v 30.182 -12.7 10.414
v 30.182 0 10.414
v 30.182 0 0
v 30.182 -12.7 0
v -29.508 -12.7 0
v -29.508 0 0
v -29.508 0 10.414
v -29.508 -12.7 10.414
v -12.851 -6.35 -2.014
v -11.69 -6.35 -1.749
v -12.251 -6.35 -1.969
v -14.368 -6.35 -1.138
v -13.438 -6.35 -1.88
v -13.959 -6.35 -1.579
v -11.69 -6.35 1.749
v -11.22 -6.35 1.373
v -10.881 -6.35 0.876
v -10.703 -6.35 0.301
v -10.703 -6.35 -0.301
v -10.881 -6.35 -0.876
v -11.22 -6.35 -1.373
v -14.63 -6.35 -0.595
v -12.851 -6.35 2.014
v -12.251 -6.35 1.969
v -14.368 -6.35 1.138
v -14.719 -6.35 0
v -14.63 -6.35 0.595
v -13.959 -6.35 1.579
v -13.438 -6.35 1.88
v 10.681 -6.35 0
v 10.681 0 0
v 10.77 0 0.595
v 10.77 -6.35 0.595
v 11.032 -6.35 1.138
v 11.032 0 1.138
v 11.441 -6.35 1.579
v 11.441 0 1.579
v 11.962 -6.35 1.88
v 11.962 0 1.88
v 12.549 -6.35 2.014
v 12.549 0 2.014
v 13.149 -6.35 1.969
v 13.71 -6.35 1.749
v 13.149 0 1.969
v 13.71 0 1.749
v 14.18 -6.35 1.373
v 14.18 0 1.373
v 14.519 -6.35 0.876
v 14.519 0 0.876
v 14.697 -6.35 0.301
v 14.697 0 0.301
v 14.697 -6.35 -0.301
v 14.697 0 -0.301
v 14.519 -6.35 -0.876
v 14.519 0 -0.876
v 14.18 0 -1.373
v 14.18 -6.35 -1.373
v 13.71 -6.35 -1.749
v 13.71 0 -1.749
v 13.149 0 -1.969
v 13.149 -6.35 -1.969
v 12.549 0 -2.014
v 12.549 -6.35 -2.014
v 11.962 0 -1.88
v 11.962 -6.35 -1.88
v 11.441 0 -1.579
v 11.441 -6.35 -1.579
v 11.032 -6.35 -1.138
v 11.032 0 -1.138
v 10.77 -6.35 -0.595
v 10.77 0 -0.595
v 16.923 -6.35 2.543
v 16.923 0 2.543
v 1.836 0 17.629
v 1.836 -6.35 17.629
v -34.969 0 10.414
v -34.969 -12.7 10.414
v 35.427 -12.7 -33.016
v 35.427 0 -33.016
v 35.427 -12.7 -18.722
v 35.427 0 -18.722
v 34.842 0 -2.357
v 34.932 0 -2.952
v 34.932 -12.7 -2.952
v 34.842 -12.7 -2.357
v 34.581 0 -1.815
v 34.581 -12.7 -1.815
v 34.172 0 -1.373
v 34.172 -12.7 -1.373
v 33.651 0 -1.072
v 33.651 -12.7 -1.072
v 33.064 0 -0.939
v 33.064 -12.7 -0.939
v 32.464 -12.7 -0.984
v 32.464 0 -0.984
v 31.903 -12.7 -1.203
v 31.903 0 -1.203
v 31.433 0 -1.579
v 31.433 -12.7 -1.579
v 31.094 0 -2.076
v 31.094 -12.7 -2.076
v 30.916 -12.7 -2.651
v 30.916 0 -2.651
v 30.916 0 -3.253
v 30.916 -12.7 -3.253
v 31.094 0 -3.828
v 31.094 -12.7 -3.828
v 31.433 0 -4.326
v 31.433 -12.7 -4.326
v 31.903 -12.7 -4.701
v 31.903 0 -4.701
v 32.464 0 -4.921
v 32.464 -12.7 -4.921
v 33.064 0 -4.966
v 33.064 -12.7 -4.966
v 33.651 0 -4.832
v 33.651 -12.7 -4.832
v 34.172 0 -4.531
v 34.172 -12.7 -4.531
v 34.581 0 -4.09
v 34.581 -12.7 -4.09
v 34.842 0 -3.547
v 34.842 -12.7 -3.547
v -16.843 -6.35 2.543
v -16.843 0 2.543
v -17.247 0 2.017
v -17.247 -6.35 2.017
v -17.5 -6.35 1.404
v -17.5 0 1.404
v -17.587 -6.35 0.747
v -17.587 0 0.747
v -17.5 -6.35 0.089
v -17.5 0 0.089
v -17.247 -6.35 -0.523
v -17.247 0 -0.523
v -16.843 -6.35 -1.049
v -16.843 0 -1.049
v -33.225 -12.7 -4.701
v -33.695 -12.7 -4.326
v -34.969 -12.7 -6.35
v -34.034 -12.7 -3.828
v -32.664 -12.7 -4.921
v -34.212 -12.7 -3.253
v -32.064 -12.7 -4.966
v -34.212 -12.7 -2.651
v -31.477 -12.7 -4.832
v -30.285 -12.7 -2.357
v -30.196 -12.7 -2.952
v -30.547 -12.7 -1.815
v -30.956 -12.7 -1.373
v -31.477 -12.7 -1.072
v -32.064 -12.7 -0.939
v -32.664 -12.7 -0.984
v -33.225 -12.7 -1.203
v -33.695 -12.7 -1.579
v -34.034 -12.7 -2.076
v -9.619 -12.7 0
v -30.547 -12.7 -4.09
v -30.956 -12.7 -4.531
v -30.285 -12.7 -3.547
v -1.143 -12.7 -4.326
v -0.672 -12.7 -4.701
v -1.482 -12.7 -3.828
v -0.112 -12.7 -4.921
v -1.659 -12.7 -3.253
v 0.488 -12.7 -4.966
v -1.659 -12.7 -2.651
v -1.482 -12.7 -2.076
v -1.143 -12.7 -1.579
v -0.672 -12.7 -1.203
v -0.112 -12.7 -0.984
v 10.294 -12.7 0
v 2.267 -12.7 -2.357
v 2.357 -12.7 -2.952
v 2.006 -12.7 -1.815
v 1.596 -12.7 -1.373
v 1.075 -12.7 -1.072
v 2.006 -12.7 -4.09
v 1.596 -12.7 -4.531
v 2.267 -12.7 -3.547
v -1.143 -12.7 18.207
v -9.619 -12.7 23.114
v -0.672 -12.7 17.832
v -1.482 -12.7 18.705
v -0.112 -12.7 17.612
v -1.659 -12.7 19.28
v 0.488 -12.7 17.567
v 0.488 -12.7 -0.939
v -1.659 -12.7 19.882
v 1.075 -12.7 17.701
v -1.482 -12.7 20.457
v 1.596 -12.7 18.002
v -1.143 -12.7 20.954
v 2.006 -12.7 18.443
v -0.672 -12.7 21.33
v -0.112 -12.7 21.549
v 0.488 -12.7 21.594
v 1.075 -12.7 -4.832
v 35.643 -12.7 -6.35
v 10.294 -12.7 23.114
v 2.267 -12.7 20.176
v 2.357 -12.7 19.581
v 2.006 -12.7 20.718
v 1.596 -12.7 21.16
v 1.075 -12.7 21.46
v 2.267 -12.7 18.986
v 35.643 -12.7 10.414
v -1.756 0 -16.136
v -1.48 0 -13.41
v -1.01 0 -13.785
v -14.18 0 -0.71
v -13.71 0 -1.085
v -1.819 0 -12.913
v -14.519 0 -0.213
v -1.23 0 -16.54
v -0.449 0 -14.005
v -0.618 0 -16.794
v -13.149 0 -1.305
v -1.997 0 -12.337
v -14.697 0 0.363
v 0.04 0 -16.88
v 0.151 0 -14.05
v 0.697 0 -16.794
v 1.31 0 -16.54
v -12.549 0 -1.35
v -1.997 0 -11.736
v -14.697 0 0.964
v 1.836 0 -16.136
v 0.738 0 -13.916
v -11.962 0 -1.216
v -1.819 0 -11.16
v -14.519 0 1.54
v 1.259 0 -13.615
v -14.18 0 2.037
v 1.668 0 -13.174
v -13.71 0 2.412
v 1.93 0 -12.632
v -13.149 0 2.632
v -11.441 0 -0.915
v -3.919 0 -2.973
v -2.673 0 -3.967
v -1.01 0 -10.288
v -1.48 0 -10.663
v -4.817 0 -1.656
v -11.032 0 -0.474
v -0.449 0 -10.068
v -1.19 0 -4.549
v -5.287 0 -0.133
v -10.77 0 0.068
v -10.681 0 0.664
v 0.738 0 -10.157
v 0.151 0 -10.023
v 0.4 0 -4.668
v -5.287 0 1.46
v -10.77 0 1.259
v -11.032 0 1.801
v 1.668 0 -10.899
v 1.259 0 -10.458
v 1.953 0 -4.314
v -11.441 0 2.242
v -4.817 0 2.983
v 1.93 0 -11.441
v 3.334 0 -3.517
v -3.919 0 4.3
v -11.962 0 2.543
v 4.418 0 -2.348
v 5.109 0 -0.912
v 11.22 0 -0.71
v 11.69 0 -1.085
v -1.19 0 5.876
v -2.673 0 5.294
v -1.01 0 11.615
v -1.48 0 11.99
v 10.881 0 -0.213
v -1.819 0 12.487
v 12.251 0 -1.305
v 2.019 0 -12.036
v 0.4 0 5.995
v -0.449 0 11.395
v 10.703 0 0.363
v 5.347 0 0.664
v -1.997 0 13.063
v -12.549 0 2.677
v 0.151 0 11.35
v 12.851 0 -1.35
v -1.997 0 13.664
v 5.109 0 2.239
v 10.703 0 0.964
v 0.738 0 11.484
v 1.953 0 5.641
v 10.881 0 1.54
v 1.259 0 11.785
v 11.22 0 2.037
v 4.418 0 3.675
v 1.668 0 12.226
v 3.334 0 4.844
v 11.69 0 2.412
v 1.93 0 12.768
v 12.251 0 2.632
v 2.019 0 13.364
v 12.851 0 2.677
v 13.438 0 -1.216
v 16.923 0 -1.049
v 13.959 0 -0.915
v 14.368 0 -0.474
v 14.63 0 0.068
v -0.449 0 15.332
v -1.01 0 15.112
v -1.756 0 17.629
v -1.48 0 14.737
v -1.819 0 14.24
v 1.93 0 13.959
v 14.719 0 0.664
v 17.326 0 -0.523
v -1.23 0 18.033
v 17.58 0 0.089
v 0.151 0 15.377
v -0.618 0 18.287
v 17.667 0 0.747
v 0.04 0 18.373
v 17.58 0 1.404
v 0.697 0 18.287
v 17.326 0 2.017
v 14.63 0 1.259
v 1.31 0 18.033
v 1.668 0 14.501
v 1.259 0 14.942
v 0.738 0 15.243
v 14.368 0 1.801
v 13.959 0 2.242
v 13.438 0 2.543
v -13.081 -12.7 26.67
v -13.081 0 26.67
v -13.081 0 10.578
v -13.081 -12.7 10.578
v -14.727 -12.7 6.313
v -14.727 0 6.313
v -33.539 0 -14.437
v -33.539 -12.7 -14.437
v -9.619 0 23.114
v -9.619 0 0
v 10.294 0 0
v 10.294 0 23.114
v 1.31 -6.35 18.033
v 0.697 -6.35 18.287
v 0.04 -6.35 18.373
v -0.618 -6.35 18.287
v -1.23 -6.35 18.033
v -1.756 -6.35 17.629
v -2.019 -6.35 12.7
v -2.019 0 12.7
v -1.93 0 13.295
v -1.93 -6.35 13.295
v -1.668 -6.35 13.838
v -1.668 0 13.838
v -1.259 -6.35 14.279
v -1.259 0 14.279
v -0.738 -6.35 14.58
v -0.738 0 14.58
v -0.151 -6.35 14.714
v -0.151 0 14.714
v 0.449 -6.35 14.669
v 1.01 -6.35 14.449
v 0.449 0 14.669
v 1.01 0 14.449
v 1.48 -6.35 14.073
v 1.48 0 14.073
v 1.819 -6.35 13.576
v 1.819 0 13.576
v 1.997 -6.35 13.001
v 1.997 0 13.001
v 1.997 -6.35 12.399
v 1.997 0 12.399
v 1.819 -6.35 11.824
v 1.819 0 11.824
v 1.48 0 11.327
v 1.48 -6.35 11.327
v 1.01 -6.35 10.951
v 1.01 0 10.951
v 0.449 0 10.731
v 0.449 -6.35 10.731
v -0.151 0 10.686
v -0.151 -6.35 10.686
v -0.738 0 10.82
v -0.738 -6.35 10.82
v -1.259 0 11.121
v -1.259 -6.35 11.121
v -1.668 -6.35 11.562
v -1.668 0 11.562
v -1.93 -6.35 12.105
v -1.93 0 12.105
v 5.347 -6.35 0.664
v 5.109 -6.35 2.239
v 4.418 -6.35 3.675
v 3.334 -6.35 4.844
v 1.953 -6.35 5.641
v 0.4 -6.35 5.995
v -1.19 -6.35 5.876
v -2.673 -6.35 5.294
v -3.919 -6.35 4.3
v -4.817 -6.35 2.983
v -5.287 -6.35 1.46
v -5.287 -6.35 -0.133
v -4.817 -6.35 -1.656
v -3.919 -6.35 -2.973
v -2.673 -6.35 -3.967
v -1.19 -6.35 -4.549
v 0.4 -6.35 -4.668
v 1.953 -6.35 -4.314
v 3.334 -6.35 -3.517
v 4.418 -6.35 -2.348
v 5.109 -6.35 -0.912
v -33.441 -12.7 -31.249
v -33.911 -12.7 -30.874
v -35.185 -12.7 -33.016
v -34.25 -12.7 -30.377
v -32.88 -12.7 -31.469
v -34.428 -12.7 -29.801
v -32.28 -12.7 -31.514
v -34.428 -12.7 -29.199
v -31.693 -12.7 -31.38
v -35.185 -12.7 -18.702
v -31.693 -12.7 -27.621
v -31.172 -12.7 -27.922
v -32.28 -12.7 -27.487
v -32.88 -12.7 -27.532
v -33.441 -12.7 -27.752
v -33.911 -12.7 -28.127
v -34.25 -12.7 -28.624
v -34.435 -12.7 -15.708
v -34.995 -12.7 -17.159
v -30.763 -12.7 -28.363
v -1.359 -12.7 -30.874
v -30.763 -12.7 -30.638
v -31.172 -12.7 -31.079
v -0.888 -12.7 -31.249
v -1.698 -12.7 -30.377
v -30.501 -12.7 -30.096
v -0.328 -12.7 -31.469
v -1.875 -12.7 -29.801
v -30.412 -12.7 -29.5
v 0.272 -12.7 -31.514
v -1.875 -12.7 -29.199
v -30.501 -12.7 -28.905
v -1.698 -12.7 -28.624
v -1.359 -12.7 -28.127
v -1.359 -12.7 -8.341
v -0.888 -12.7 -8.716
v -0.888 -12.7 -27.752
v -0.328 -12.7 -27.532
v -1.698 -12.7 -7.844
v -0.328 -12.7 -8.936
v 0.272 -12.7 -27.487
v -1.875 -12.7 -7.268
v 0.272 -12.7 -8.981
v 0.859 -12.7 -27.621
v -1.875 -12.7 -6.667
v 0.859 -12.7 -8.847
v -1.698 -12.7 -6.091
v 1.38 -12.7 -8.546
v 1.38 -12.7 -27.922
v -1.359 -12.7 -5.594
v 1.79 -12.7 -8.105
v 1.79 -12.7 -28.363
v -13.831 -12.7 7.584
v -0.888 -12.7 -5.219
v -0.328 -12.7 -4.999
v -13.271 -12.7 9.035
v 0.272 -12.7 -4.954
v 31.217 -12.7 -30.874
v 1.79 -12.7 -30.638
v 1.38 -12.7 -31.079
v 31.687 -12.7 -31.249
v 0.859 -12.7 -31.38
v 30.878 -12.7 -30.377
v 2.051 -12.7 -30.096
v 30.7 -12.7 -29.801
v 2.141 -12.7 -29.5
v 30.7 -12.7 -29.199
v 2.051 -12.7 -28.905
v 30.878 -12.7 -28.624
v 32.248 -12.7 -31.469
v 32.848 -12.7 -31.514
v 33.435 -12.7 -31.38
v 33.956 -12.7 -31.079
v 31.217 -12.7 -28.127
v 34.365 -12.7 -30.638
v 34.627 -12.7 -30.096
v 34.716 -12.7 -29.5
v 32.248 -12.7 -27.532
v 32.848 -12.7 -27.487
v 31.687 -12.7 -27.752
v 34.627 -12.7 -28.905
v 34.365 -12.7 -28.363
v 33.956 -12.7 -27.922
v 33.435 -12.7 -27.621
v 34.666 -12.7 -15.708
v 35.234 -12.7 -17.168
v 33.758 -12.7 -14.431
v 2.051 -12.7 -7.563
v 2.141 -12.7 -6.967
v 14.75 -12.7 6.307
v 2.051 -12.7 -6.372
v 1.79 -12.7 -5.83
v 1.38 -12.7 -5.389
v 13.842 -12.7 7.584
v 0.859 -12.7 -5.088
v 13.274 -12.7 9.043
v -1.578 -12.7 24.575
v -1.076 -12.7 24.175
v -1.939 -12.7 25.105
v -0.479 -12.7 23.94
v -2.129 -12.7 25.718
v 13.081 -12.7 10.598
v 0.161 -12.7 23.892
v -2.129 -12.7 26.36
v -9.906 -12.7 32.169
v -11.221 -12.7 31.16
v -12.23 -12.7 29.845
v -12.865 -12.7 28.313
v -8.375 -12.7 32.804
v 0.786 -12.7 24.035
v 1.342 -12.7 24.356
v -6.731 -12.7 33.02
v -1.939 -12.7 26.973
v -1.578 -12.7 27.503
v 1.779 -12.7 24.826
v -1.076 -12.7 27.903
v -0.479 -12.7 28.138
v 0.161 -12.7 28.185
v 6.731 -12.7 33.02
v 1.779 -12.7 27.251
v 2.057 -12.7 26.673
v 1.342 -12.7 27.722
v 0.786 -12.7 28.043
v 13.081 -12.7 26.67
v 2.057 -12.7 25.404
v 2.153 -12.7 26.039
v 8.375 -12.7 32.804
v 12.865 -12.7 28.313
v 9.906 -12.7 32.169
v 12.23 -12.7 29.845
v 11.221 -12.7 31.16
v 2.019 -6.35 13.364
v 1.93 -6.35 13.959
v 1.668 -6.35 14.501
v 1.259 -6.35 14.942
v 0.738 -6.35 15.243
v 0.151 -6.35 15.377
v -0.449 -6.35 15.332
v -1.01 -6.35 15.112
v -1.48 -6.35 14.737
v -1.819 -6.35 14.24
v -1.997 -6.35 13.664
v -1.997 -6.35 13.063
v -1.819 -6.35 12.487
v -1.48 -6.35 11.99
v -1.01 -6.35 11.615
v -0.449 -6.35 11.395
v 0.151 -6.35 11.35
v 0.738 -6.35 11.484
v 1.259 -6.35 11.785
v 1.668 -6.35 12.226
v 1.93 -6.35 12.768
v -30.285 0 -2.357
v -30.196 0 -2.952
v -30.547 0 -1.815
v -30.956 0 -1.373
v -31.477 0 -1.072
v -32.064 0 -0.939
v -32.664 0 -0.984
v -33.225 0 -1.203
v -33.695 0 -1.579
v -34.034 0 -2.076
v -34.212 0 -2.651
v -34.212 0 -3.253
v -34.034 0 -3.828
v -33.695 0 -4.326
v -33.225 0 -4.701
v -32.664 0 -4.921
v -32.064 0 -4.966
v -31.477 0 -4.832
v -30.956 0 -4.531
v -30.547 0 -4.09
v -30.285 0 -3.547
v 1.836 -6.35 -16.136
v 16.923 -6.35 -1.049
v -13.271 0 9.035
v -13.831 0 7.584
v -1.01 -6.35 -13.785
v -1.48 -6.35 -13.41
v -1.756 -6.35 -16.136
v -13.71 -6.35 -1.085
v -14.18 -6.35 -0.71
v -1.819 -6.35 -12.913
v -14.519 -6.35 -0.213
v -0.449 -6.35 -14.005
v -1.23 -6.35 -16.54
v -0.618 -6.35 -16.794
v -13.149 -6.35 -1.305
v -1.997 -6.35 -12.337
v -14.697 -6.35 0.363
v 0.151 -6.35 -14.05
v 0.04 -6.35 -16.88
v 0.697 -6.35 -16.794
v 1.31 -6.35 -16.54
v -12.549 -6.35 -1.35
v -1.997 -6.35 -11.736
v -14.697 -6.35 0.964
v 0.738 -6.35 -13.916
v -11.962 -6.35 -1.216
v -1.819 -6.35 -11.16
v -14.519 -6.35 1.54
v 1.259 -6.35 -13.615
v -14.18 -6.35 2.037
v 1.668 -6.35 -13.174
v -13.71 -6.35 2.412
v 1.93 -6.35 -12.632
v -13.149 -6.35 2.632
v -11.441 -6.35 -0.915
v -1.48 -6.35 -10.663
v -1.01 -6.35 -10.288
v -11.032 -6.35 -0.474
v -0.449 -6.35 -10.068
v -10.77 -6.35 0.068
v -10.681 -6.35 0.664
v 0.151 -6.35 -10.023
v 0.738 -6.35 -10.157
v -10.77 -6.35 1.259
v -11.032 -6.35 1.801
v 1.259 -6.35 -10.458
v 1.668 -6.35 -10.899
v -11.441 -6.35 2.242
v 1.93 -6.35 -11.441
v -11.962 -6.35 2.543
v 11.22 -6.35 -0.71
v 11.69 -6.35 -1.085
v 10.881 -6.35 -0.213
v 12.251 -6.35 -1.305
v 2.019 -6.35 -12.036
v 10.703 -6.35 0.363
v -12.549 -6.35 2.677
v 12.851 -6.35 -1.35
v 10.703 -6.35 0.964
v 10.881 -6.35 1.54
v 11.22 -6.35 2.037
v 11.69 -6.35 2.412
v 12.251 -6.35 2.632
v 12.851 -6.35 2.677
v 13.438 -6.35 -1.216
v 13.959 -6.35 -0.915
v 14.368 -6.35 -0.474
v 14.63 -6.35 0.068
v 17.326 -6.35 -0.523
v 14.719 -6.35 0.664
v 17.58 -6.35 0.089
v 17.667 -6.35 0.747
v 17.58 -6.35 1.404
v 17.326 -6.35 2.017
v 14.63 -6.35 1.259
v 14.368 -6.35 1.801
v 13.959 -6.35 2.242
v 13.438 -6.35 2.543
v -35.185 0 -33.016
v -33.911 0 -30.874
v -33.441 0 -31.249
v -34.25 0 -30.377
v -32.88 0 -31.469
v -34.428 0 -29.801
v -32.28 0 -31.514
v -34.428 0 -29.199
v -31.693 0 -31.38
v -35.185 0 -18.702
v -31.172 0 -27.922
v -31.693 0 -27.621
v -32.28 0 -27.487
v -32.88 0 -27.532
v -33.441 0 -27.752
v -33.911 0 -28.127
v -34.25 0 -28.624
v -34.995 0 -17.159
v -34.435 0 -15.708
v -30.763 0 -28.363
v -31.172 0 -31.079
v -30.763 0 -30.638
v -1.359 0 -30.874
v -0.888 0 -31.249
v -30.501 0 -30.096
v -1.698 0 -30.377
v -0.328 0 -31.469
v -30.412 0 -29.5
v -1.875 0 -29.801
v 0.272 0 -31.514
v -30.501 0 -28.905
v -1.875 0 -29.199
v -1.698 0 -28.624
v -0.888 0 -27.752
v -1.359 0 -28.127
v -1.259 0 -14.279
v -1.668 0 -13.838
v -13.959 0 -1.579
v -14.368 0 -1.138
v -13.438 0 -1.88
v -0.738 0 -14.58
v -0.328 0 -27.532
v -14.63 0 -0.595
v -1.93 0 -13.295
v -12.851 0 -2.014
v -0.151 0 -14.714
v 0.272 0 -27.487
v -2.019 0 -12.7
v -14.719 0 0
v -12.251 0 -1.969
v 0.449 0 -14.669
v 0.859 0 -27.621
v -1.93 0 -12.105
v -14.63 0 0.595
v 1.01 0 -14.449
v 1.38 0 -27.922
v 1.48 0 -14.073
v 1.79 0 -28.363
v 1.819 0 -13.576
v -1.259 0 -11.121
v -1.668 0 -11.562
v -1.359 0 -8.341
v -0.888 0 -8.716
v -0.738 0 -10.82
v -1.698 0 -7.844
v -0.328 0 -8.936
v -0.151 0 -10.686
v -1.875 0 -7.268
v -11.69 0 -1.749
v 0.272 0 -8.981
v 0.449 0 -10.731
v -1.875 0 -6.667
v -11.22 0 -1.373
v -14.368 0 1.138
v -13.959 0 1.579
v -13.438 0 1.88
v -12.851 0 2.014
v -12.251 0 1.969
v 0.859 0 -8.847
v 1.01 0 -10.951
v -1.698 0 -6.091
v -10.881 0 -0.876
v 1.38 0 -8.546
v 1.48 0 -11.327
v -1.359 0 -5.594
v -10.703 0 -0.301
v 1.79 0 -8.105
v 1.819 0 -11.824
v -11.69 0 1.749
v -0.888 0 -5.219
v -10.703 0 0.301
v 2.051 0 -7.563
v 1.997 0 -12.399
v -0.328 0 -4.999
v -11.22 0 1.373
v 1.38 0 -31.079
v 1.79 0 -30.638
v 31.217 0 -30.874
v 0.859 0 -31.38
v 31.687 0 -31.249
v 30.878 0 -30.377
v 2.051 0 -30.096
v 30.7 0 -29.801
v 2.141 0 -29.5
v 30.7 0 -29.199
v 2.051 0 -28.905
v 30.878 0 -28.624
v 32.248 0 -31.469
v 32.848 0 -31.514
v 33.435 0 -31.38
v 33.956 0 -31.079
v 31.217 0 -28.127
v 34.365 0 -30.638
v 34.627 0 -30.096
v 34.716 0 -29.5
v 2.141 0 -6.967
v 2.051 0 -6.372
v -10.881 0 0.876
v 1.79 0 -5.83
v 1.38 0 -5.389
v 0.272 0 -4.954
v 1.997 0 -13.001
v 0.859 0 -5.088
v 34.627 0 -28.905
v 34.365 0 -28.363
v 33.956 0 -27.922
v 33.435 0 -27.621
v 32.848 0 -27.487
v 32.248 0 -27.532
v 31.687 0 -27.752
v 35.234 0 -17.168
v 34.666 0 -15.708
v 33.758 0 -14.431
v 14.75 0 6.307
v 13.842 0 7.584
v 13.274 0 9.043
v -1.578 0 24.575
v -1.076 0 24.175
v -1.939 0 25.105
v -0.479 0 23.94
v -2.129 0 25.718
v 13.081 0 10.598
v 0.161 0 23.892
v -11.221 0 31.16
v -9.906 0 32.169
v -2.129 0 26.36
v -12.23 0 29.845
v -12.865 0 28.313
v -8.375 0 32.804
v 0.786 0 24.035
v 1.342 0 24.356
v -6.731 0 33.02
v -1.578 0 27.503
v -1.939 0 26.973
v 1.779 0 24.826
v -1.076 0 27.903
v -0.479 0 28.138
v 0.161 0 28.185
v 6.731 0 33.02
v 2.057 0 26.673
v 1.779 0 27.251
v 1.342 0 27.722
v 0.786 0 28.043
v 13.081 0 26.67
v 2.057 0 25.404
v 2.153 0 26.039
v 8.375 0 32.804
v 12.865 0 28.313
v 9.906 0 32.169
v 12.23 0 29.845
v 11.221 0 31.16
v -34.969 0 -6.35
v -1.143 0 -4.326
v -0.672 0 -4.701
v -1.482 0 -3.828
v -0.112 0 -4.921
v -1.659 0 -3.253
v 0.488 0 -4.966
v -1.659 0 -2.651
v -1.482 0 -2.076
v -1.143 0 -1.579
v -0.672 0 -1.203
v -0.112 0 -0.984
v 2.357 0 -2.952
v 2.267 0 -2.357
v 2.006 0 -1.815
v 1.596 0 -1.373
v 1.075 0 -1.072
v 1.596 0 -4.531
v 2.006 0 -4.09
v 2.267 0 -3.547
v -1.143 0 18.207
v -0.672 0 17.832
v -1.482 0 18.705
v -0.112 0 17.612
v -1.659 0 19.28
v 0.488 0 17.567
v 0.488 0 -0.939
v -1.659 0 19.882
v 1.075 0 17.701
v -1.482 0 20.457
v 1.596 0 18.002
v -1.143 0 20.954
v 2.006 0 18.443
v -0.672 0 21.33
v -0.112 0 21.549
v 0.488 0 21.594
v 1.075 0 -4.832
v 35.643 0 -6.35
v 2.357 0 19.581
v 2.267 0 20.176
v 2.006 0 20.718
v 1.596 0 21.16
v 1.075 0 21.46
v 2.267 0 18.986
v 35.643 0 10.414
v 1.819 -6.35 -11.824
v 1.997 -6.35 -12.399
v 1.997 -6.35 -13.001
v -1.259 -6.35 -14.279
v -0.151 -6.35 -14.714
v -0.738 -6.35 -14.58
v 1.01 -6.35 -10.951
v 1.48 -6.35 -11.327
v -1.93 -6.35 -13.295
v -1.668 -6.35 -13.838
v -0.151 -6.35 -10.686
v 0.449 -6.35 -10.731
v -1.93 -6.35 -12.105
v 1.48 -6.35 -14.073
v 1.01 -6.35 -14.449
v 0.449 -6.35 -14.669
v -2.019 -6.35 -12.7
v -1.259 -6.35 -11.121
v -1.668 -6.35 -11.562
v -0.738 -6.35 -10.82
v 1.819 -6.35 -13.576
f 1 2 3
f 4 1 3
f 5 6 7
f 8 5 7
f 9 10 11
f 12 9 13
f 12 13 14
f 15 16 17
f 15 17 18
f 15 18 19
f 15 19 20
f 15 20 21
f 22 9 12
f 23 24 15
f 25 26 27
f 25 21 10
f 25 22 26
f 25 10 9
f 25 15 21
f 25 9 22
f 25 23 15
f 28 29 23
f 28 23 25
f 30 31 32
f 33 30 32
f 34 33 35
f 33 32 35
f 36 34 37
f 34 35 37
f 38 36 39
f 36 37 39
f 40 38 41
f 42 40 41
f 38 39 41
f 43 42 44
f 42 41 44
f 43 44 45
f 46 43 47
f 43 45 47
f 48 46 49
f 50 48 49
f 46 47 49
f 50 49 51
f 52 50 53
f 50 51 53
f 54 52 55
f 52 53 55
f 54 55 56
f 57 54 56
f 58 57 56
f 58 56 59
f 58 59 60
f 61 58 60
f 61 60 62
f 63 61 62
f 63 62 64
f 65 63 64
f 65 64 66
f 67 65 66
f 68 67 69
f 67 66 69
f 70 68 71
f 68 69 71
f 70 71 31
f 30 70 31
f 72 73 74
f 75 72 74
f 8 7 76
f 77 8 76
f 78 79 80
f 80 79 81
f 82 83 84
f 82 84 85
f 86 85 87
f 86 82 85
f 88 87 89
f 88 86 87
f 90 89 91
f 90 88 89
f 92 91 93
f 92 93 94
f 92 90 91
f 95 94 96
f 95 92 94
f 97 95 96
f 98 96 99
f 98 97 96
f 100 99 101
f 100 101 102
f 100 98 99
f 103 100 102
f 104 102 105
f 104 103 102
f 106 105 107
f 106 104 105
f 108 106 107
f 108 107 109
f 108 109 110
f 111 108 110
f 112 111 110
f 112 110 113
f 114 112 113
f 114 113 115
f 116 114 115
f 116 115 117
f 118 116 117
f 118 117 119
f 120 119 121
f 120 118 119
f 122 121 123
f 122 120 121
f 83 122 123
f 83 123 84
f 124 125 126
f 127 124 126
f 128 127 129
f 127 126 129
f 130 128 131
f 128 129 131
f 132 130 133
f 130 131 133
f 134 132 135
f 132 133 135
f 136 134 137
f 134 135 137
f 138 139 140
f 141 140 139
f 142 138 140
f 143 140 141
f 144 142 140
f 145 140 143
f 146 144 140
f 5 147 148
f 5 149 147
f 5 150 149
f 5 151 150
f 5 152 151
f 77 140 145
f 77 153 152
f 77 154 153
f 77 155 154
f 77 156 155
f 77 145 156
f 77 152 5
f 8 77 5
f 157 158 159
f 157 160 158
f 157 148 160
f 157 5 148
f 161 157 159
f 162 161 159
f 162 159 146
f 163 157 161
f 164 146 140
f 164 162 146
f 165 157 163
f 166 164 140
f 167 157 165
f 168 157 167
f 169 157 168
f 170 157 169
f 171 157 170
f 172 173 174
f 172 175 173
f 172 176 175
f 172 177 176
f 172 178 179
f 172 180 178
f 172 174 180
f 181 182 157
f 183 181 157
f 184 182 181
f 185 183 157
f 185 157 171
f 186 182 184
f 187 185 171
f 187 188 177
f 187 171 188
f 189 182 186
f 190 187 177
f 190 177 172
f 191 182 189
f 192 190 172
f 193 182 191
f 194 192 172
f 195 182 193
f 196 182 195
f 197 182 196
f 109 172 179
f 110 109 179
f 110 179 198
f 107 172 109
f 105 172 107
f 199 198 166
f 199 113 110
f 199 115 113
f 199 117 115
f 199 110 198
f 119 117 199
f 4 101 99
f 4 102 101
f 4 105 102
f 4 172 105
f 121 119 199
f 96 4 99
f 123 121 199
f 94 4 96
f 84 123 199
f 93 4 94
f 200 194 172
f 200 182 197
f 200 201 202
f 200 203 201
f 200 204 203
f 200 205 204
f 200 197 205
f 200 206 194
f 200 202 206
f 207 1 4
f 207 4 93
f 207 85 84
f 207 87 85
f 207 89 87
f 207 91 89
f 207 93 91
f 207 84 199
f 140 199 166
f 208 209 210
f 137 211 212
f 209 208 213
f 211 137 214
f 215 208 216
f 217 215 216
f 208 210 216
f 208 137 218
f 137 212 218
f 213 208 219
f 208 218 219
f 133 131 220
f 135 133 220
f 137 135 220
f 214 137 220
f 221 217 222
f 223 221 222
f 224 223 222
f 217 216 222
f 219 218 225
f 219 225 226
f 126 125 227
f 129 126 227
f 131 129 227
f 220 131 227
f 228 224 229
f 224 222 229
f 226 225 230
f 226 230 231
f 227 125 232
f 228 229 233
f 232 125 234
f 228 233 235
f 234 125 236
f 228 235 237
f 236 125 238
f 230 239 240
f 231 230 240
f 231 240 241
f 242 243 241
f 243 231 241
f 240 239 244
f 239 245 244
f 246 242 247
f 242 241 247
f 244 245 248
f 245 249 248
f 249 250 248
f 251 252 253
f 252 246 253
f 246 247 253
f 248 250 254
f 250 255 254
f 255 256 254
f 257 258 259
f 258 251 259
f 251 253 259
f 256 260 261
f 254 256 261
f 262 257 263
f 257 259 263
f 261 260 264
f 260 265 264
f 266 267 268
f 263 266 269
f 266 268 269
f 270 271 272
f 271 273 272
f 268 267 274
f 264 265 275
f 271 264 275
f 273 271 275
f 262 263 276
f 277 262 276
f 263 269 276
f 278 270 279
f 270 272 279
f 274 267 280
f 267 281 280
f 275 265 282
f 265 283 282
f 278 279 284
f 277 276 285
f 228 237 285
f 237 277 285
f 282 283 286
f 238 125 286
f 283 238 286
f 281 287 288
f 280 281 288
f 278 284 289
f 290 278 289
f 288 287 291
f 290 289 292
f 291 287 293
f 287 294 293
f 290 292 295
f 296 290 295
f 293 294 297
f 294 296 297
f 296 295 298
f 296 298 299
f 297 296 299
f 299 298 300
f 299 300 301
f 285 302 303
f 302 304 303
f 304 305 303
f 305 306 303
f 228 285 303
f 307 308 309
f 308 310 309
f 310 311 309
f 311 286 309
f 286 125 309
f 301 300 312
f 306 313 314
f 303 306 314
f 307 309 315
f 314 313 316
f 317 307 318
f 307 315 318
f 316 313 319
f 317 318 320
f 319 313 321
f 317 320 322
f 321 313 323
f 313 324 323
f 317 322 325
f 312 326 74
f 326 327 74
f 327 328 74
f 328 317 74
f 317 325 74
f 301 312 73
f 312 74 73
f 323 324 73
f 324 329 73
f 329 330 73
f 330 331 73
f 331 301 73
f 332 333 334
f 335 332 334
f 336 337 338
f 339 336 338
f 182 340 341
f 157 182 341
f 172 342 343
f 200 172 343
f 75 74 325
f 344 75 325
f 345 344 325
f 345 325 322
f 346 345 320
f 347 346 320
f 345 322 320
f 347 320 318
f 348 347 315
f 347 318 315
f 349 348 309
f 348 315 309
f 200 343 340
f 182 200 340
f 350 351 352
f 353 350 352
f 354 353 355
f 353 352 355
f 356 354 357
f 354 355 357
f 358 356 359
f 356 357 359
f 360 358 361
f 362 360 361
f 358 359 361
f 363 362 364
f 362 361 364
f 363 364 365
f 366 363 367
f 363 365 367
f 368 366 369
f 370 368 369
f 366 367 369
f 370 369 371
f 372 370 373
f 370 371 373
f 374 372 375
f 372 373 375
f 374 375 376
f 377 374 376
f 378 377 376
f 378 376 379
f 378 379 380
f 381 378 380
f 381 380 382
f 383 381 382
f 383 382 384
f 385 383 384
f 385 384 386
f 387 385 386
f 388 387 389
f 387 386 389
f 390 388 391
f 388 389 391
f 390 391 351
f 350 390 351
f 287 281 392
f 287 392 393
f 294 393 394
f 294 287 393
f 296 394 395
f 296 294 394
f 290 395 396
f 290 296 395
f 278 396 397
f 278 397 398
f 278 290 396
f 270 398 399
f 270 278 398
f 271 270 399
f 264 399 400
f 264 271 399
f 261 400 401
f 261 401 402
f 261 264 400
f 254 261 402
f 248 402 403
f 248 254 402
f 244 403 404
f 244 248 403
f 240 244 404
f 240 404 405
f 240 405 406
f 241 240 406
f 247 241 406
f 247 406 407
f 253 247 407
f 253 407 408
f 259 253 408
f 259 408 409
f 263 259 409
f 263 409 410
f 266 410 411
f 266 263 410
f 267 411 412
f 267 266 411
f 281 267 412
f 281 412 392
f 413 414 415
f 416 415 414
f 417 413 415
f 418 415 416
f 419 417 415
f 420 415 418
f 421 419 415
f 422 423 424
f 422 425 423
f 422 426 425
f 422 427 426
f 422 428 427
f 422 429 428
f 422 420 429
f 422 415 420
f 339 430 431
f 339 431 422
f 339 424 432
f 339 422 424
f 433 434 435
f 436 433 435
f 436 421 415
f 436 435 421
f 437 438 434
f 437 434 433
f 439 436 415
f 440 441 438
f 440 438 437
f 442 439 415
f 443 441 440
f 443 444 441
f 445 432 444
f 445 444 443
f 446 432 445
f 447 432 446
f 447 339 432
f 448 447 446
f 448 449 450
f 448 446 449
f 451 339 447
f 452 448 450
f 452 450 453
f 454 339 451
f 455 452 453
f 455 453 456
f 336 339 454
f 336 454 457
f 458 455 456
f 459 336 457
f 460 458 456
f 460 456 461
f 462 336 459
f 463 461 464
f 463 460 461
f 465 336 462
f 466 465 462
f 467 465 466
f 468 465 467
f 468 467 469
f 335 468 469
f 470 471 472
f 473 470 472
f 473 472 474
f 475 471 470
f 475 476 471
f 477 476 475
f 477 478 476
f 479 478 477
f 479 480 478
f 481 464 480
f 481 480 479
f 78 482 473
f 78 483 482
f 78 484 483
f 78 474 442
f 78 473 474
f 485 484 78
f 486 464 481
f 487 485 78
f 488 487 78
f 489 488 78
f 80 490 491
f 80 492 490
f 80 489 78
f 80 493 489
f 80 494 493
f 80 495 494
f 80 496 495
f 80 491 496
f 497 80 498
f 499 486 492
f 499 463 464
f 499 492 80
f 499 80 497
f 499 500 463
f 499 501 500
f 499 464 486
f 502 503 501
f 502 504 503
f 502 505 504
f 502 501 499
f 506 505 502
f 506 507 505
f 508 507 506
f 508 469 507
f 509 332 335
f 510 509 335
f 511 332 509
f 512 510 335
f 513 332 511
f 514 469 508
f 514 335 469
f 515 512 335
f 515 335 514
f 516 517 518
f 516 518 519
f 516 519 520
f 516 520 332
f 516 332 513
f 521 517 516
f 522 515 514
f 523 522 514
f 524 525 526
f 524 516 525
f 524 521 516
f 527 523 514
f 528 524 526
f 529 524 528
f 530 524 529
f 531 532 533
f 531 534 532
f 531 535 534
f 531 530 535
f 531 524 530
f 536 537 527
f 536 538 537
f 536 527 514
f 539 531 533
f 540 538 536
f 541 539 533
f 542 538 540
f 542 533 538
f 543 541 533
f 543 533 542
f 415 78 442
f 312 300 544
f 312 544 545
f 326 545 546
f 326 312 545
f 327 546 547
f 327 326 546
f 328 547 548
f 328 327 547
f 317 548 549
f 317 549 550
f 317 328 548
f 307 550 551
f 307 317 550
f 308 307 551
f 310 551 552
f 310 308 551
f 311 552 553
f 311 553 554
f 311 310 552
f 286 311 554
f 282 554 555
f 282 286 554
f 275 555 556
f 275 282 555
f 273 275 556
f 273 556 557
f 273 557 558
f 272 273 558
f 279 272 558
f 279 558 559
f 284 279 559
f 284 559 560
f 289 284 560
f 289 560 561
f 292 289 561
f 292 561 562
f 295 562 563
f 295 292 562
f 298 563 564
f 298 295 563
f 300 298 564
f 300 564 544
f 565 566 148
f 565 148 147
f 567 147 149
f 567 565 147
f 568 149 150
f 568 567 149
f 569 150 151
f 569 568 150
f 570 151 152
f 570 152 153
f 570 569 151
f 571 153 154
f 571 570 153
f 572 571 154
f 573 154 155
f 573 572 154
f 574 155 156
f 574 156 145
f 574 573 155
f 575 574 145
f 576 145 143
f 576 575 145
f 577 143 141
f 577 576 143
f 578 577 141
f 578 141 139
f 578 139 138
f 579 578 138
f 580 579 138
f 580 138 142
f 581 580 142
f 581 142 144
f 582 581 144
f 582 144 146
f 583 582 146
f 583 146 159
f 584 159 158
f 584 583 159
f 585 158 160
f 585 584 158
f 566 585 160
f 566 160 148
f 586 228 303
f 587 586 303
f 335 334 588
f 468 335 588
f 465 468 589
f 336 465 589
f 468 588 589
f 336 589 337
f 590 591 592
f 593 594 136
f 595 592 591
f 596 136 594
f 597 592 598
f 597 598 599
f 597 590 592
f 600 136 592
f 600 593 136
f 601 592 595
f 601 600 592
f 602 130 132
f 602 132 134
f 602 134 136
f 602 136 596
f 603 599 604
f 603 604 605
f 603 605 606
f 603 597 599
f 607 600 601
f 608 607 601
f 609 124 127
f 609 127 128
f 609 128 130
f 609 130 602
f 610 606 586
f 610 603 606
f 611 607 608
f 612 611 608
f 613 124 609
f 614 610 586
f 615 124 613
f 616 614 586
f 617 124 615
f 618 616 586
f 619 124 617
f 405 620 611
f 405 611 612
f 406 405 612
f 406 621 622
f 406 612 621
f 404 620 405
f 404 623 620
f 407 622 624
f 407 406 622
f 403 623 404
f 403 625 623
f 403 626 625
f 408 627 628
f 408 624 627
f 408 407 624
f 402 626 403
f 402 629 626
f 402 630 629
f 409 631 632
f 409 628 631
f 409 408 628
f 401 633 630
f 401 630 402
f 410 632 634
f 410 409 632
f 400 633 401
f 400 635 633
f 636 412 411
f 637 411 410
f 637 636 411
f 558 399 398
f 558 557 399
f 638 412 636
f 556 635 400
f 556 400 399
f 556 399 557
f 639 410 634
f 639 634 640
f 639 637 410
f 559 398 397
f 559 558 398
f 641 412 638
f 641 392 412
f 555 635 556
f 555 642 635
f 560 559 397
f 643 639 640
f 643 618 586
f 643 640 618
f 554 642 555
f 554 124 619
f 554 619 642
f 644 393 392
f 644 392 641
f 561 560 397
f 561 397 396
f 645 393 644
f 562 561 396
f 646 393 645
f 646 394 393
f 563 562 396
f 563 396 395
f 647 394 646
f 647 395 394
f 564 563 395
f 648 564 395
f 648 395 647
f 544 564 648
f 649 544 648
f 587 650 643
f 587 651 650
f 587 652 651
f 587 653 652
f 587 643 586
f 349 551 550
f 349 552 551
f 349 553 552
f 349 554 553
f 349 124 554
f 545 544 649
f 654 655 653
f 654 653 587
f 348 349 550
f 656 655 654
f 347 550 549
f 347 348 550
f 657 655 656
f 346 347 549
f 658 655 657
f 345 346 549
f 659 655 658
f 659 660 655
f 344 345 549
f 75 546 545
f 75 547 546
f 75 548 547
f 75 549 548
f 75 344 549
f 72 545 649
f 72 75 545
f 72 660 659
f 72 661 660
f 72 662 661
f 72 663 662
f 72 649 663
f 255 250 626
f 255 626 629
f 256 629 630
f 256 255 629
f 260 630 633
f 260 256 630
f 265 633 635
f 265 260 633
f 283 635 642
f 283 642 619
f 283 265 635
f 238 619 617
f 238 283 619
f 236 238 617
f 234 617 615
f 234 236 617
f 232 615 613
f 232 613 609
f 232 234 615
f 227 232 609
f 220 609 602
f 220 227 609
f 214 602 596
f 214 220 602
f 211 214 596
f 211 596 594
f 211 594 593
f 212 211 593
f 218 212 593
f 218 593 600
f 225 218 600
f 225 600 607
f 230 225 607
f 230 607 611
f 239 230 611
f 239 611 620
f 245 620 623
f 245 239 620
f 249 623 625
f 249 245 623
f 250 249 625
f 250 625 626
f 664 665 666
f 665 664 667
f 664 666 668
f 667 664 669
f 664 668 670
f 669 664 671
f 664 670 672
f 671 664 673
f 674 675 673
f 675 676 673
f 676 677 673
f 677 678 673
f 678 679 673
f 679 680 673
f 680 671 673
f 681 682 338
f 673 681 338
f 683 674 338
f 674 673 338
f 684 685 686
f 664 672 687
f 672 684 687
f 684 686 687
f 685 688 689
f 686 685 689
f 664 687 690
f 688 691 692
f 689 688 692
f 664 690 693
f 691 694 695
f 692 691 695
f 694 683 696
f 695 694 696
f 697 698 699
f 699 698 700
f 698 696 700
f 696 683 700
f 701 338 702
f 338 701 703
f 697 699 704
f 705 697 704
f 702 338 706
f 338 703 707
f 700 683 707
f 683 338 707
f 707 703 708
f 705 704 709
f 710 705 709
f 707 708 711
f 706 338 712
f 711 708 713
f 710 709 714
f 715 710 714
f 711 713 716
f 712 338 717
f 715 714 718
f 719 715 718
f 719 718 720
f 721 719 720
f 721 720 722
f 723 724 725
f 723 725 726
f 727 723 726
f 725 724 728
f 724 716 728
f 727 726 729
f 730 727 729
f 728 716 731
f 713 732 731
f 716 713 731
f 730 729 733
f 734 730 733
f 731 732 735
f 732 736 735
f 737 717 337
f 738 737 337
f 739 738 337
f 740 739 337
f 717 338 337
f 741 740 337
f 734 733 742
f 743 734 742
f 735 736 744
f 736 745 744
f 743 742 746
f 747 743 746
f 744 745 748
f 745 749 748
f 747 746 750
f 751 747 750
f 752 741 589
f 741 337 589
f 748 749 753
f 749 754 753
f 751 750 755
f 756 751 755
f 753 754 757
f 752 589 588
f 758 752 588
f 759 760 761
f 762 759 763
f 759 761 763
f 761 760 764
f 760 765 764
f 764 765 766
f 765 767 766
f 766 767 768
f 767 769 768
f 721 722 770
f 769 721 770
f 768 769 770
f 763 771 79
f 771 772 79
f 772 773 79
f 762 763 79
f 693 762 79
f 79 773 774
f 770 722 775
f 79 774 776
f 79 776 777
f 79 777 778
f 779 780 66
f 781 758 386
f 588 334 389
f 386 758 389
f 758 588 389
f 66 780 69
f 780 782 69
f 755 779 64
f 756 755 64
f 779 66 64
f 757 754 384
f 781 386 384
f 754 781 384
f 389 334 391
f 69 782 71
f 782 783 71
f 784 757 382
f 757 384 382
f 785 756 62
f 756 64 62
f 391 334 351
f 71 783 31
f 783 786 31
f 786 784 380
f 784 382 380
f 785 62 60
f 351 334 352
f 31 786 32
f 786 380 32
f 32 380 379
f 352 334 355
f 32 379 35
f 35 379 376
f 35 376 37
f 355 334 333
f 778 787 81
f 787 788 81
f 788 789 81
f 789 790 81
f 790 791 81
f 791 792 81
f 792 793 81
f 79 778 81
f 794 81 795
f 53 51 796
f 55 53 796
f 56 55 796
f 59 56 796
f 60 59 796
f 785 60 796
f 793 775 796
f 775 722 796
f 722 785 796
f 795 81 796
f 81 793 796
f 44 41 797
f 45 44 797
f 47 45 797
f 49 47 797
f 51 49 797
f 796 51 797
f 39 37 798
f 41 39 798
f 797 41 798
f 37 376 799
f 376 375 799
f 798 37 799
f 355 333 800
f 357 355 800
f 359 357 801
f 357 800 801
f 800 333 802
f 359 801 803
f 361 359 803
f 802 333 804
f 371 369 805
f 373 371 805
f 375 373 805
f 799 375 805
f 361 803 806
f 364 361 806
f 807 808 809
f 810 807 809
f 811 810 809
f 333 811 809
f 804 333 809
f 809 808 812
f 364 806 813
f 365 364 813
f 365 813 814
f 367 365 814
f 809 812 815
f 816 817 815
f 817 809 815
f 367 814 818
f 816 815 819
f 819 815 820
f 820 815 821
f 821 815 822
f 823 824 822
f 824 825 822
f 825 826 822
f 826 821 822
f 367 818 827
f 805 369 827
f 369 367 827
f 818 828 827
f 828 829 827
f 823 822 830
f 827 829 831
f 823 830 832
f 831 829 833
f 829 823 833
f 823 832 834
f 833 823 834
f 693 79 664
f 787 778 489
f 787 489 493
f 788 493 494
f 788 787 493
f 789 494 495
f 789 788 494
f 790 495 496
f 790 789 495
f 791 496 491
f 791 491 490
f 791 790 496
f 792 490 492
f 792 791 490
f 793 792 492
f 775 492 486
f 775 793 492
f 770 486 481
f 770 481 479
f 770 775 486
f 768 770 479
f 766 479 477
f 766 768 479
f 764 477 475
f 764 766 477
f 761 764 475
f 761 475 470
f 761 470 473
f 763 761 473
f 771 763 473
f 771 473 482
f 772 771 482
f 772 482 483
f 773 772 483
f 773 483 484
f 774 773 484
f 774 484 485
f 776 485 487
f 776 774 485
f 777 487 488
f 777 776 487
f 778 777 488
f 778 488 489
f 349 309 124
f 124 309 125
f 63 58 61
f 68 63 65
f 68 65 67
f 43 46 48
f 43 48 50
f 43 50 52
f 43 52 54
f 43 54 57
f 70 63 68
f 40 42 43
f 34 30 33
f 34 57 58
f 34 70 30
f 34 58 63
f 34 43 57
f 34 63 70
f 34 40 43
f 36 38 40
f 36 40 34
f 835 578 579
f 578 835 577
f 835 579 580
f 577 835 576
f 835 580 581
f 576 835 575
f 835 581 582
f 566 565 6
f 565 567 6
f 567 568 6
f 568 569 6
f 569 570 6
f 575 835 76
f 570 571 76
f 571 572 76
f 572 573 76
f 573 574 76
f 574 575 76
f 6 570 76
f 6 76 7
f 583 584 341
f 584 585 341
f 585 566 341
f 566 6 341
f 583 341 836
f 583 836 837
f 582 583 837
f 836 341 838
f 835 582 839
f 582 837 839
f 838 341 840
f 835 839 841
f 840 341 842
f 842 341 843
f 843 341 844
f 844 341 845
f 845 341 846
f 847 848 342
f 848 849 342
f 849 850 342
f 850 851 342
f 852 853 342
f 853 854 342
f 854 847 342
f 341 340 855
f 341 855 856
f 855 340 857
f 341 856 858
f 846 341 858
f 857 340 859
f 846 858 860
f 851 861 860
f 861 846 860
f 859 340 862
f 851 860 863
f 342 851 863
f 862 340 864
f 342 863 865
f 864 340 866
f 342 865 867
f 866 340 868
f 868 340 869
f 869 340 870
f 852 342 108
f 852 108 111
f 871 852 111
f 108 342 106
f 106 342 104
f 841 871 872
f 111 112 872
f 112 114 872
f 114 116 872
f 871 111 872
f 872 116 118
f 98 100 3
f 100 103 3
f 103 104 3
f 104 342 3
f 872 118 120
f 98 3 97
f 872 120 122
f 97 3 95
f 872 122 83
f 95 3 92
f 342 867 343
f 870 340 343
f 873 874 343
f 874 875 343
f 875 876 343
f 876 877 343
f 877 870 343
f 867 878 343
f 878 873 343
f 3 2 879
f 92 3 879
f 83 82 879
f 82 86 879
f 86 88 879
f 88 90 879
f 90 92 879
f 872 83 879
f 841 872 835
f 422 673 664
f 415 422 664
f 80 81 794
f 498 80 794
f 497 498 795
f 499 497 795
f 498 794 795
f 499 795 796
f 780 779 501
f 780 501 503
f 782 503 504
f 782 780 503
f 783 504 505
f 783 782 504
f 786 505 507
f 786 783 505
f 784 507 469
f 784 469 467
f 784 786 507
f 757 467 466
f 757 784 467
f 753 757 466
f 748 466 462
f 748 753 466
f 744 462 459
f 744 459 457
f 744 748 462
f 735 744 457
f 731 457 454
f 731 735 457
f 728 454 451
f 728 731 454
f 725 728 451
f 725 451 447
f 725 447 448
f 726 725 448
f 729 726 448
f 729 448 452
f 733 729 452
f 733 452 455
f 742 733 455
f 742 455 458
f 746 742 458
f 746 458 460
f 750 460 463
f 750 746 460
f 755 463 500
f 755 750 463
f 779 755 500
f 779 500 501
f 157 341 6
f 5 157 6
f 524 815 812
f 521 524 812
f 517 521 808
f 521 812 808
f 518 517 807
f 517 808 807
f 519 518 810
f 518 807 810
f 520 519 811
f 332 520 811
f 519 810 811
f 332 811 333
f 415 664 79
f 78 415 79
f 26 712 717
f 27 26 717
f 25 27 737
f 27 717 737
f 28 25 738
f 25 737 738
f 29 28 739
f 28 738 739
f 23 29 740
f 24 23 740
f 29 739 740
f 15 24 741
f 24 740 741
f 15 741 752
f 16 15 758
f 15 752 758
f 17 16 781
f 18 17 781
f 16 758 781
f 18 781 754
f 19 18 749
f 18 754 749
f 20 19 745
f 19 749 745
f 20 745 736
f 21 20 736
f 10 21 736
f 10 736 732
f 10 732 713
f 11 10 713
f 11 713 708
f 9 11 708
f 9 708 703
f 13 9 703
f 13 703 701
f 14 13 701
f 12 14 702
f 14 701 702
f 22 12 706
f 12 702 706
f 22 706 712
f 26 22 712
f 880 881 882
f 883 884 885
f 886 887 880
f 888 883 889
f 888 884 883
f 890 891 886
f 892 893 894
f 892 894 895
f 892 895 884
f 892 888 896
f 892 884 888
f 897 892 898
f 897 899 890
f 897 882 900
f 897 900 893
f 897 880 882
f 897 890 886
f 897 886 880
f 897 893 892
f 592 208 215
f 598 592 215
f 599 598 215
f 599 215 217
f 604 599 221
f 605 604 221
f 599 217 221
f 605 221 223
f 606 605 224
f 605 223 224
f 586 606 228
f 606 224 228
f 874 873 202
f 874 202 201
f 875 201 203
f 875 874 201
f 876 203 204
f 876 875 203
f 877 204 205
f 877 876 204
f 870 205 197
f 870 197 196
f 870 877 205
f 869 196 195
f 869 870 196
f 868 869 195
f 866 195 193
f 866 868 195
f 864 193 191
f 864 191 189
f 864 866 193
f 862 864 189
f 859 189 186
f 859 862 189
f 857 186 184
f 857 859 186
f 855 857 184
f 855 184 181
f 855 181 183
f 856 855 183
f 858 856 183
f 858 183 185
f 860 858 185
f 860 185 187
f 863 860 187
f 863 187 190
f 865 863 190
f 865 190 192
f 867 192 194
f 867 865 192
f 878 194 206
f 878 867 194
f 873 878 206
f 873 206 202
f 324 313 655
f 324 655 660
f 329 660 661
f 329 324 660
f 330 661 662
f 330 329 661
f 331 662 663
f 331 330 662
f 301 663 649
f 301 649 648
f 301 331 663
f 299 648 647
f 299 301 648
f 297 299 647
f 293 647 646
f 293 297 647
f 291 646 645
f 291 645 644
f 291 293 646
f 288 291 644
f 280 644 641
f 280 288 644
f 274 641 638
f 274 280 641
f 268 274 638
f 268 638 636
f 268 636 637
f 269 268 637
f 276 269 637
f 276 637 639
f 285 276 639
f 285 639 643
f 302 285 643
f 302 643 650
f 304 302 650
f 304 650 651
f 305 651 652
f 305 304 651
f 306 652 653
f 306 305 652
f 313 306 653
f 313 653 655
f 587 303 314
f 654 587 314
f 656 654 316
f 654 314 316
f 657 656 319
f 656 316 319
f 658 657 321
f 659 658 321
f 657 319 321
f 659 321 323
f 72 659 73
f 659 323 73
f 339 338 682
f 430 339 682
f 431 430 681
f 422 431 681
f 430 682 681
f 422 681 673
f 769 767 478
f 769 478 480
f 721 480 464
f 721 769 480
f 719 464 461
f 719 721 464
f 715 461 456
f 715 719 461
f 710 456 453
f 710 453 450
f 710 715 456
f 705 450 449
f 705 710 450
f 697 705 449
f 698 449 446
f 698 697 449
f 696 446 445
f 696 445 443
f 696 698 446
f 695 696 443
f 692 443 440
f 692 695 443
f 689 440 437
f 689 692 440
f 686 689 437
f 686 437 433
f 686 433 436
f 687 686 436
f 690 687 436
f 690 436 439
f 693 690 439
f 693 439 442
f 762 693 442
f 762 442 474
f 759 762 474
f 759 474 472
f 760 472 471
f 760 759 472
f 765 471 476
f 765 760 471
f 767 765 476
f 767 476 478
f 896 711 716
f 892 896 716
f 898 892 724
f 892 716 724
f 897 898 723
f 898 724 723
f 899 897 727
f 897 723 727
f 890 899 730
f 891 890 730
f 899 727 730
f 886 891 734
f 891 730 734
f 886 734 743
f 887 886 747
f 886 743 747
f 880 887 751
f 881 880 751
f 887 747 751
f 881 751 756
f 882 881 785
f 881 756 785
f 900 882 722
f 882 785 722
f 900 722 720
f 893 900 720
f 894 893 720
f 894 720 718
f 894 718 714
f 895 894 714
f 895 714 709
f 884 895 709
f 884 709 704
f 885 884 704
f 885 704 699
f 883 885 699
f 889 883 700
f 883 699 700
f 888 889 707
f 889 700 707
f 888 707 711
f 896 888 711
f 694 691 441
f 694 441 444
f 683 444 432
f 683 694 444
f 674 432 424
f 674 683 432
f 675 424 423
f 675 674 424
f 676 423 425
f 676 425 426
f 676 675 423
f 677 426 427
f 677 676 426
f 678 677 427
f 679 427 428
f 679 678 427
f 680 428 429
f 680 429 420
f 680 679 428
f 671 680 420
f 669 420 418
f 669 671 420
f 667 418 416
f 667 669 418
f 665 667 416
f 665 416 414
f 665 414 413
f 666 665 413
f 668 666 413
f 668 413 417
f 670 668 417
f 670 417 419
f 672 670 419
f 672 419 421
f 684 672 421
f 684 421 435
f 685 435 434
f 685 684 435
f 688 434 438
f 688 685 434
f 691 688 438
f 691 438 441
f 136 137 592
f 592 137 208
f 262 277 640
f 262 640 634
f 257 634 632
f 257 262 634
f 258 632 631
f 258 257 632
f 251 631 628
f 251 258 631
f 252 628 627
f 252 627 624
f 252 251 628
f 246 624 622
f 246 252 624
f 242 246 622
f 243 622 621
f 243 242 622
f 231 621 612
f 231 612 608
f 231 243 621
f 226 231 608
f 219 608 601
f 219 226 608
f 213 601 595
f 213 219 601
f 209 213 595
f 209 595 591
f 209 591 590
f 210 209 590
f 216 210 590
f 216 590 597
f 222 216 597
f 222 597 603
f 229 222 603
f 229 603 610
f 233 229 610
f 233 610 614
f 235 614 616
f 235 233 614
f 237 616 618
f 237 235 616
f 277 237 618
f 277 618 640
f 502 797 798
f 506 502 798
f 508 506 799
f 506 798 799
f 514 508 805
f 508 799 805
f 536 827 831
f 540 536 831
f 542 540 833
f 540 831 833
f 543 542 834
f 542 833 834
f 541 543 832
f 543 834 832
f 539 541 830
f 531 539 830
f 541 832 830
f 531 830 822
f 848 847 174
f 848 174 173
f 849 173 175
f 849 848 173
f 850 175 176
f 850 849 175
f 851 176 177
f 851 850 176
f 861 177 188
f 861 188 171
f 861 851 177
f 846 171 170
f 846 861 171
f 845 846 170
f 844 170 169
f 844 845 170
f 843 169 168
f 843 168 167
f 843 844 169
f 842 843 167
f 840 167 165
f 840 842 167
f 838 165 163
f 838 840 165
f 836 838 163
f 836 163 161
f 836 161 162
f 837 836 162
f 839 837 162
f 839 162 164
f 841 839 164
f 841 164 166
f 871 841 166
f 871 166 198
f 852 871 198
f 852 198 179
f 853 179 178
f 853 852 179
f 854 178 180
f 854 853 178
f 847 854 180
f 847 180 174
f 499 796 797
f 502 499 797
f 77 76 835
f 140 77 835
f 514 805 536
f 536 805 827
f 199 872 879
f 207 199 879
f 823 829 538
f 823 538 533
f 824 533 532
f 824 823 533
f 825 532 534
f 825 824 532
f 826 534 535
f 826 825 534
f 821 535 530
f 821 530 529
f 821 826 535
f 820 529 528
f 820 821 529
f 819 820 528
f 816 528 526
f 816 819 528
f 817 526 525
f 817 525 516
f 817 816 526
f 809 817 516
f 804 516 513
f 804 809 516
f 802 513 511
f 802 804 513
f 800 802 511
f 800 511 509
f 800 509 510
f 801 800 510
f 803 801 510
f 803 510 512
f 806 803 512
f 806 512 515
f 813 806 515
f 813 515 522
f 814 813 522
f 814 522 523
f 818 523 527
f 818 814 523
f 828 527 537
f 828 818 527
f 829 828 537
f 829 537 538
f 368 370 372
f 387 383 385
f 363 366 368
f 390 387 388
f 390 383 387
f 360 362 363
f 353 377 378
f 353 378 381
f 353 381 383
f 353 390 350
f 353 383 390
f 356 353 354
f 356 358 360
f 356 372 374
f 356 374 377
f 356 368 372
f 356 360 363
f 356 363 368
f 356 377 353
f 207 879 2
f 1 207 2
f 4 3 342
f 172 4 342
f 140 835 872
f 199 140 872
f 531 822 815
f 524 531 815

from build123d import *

# Parameters (mm, degrees)
F0_R     = 2.0193
F0_R_2   = 2.15265
F1_DEPTH = 12.7
F2_R     = 2.0193
F3_DEPTH = 6.35
F5_DEPTH = 6.35
F6_R     = 2.0193
F7_DEPTH = 12.7
F8_R     = 2.0193
F8_R_2   = 5.3467
F9_DEPTH = 6.35


with BuildPart() as f1:
    # F0 (on Front) → F1 (new body)
    with BuildSketch(Plane.XZ):
        with BuildLine():
            Line((-35.185121, -18.702235), (-35.185121, -33.016177))
            Line((-35.185121, -33.016177), (34.918879, -33.016177))
            Line((34.918879, -33.016177), (35.426879, -33.016177))
            Line((35.426879, -33.016177), (35.426879, -32.508177))
            Line((35.426879, -32.508177), (35.426879, -18.72201))
            ThreePointArc((35.426879, -18.72201), (34.994986, -16.420162), (33.758058, -14.431432))
            Line((33.758058, -14.431432), (14.749821, 6.307252))
            ThreePointArc((14.749821, 6.307252), (13.512893, 8.295982), (13.081, 10.597831))
            Line((13.081, 10.597831), (13.081, 26.669998))
            ThreePointArc((13.081, 26.669998), (11.221128, 31.160126), (6.731, 33.019998))
            Line((6.731, 33.019998), (-6.731, 33.019998))
            ThreePointArc((-6.731, 33.019998), (-11.221128, 31.160126), (-13.081, 26.669998))
            Line((-13.081, 26.669998), (-13.081, 10.578056))
            ThreePointArc((-13.081, 10.578056), (-13.506681, 8.292241), (-14.726654, 6.312892))
            Line((-14.726654, 6.312892), (-33.539467, -14.437071))
            ThreePointArc((-33.539467, -14.437071), (-34.75944, -16.41642), (-35.185121, -18.702235))
        make_face()
        with Locations((-32.43101, -29.500403)):
            Circle(F0_R, mode=Mode.SUBTRACT)
        with Locations((0.121423, -29.500403)):
            Circle(F0_R, mode=Mode.SUBTRACT)
        with Locations((32.696923, -29.500403)):
            Circle(F0_R, mode=Mode.SUBTRACT)
        with Locations((0.121423, -6.967465)):
            Circle(F0_R, mode=Mode.SUBTRACT)
        with Locations((0, 26.038823)):
            Circle(F0_R_2, mode=Mode.SUBTRACT)
    extrude(amount=F1_DEPTH)

    # F2 (on face) → F3 (cut)
    with BuildSketch(Plane(origin=(0, 0, 0), x_dir=(-1, 0, 0), z_dir=(0, 1, 0))):
        with Locations((0, 12.7)):
            Circle(F2_R)
        with Locations((-12.7, 0)):
            Circle(F2_R)
        with Locations((12.7, 0)):
            Circle(F2_R)
        with Locations((0, -12.7)):
            Circle(F2_R)
    extrude(amount=-F3_DEPTH, mode=Mode.SUBTRACT)


with BuildPart() as f5:
    # F4 (on face) → F5 (new body)
    with BuildSketch(Plane(origin=(0, 0, 0), x_dir=(-1, 0, 0), z_dir=(0, 1, 0))):
        with BuildLine():
            ThreePointArc((1.796051, 16.882882), (0, 17.62683), (-1.796051, 16.882882))
            Line((-1.796051, 16.882882), (-16.882882, 1.796051))
            ThreePointArc((-16.882882, 1.796051), (-17.62683, 0), (-16.882882, -1.796051))
            Line((-16.882882, -1.796051), (-1.796051, -16.882882))
            ThreePointArc((-1.796051, -16.882882), (0, -17.62683), (1.796051, -16.882882))
            Line((1.796051, -16.882882), (16.882882, -1.796051))
            ThreePointArc((16.882882, -1.796051), (17.62683, 0), (16.882882, 1.796051))
            Line((16.882882, 1.796051), (1.796051, 16.882882))
        make_face()
    extrude(amount=F5_DEPTH)


with BuildPart() as f7:
    # F6 (on Front) → F7 (new body)
    with BuildSketch(Plane.XZ):
        Polygon((-34.968648, -6.35), (35.643352, -6.35), (35.643352, 10.414), (30.182352, 10.414), (30.182352, 0), (10.294152, 0), (10.294152, 23.114), (-9.619448, 23.114), (-9.619448, 0), (-29.507648, 0), (-29.507648, 10.414), (-34.968648, 10.414), align=None)
        with Locations((-32.215081, -2.952176)):
            Circle(F6_R, mode=Mode.SUBTRACT)
        with Locations((0.337352, -2.952176)):
            Circle(F6_R, mode=Mode.SUBTRACT)
        with Locations((32.912852, -2.952176)):
            Circle(F6_R, mode=Mode.SUBTRACT)
        with Locations((0.337352, 19.580761)):
            Circle(F6_R, mode=Mode.SUBTRACT)
    extrude(amount=F7_DEPTH)


with BuildPart() as f9:
    # F8 (on Front) → F9 (new body)
    with BuildSketch(Plane.XZ):
        with BuildLine():
            ThreePointArc((1.835898, 17.629441), (0.039847, 18.37339), (-1.756204, 17.629441))
            Line((-1.756204, 17.629441), (-16.843035, 2.542611))
            ThreePointArc((-16.843035, 2.542611), (-17.586983, 0.746559), (-16.843035, -1.049492))
            Line((-16.843035, -1.049492), (-1.756204, -16.136322))
            ThreePointArc((-1.756204, -16.136322), (0.039847, -16.880271), (1.835898, -16.136322))
            Line((1.835898, -16.136322), (16.922728, -1.049492))
            ThreePointArc((16.922728, -1.049492), (17.666677, 0.746559), (16.922728, 2.542611))
            Line((16.922728, 2.542611), (1.835898, 17.629441))
        make_face()
        with Locations((0, -12.036494)):
            Circle(F8_R, mode=Mode.SUBTRACT)
        with Locations((-12.7, 0.663506)):
            Circle(F8_R, mode=Mode.SUBTRACT)
        with Locations((0, 0.663506)):
            Circle(F8_R_2, mode=Mode.SUBTRACT)
        with Locations((12.7, 0.663506)):
            Circle(F8_R, mode=Mode.SUBTRACT)
        with Locations((0, 13.363506)):
            Circle(F8_R, mode=Mode.SUBTRACT)
    extrude(amount=F9_DEPTH)


solid = Compound([f1.part, f7.part, f9.part])
